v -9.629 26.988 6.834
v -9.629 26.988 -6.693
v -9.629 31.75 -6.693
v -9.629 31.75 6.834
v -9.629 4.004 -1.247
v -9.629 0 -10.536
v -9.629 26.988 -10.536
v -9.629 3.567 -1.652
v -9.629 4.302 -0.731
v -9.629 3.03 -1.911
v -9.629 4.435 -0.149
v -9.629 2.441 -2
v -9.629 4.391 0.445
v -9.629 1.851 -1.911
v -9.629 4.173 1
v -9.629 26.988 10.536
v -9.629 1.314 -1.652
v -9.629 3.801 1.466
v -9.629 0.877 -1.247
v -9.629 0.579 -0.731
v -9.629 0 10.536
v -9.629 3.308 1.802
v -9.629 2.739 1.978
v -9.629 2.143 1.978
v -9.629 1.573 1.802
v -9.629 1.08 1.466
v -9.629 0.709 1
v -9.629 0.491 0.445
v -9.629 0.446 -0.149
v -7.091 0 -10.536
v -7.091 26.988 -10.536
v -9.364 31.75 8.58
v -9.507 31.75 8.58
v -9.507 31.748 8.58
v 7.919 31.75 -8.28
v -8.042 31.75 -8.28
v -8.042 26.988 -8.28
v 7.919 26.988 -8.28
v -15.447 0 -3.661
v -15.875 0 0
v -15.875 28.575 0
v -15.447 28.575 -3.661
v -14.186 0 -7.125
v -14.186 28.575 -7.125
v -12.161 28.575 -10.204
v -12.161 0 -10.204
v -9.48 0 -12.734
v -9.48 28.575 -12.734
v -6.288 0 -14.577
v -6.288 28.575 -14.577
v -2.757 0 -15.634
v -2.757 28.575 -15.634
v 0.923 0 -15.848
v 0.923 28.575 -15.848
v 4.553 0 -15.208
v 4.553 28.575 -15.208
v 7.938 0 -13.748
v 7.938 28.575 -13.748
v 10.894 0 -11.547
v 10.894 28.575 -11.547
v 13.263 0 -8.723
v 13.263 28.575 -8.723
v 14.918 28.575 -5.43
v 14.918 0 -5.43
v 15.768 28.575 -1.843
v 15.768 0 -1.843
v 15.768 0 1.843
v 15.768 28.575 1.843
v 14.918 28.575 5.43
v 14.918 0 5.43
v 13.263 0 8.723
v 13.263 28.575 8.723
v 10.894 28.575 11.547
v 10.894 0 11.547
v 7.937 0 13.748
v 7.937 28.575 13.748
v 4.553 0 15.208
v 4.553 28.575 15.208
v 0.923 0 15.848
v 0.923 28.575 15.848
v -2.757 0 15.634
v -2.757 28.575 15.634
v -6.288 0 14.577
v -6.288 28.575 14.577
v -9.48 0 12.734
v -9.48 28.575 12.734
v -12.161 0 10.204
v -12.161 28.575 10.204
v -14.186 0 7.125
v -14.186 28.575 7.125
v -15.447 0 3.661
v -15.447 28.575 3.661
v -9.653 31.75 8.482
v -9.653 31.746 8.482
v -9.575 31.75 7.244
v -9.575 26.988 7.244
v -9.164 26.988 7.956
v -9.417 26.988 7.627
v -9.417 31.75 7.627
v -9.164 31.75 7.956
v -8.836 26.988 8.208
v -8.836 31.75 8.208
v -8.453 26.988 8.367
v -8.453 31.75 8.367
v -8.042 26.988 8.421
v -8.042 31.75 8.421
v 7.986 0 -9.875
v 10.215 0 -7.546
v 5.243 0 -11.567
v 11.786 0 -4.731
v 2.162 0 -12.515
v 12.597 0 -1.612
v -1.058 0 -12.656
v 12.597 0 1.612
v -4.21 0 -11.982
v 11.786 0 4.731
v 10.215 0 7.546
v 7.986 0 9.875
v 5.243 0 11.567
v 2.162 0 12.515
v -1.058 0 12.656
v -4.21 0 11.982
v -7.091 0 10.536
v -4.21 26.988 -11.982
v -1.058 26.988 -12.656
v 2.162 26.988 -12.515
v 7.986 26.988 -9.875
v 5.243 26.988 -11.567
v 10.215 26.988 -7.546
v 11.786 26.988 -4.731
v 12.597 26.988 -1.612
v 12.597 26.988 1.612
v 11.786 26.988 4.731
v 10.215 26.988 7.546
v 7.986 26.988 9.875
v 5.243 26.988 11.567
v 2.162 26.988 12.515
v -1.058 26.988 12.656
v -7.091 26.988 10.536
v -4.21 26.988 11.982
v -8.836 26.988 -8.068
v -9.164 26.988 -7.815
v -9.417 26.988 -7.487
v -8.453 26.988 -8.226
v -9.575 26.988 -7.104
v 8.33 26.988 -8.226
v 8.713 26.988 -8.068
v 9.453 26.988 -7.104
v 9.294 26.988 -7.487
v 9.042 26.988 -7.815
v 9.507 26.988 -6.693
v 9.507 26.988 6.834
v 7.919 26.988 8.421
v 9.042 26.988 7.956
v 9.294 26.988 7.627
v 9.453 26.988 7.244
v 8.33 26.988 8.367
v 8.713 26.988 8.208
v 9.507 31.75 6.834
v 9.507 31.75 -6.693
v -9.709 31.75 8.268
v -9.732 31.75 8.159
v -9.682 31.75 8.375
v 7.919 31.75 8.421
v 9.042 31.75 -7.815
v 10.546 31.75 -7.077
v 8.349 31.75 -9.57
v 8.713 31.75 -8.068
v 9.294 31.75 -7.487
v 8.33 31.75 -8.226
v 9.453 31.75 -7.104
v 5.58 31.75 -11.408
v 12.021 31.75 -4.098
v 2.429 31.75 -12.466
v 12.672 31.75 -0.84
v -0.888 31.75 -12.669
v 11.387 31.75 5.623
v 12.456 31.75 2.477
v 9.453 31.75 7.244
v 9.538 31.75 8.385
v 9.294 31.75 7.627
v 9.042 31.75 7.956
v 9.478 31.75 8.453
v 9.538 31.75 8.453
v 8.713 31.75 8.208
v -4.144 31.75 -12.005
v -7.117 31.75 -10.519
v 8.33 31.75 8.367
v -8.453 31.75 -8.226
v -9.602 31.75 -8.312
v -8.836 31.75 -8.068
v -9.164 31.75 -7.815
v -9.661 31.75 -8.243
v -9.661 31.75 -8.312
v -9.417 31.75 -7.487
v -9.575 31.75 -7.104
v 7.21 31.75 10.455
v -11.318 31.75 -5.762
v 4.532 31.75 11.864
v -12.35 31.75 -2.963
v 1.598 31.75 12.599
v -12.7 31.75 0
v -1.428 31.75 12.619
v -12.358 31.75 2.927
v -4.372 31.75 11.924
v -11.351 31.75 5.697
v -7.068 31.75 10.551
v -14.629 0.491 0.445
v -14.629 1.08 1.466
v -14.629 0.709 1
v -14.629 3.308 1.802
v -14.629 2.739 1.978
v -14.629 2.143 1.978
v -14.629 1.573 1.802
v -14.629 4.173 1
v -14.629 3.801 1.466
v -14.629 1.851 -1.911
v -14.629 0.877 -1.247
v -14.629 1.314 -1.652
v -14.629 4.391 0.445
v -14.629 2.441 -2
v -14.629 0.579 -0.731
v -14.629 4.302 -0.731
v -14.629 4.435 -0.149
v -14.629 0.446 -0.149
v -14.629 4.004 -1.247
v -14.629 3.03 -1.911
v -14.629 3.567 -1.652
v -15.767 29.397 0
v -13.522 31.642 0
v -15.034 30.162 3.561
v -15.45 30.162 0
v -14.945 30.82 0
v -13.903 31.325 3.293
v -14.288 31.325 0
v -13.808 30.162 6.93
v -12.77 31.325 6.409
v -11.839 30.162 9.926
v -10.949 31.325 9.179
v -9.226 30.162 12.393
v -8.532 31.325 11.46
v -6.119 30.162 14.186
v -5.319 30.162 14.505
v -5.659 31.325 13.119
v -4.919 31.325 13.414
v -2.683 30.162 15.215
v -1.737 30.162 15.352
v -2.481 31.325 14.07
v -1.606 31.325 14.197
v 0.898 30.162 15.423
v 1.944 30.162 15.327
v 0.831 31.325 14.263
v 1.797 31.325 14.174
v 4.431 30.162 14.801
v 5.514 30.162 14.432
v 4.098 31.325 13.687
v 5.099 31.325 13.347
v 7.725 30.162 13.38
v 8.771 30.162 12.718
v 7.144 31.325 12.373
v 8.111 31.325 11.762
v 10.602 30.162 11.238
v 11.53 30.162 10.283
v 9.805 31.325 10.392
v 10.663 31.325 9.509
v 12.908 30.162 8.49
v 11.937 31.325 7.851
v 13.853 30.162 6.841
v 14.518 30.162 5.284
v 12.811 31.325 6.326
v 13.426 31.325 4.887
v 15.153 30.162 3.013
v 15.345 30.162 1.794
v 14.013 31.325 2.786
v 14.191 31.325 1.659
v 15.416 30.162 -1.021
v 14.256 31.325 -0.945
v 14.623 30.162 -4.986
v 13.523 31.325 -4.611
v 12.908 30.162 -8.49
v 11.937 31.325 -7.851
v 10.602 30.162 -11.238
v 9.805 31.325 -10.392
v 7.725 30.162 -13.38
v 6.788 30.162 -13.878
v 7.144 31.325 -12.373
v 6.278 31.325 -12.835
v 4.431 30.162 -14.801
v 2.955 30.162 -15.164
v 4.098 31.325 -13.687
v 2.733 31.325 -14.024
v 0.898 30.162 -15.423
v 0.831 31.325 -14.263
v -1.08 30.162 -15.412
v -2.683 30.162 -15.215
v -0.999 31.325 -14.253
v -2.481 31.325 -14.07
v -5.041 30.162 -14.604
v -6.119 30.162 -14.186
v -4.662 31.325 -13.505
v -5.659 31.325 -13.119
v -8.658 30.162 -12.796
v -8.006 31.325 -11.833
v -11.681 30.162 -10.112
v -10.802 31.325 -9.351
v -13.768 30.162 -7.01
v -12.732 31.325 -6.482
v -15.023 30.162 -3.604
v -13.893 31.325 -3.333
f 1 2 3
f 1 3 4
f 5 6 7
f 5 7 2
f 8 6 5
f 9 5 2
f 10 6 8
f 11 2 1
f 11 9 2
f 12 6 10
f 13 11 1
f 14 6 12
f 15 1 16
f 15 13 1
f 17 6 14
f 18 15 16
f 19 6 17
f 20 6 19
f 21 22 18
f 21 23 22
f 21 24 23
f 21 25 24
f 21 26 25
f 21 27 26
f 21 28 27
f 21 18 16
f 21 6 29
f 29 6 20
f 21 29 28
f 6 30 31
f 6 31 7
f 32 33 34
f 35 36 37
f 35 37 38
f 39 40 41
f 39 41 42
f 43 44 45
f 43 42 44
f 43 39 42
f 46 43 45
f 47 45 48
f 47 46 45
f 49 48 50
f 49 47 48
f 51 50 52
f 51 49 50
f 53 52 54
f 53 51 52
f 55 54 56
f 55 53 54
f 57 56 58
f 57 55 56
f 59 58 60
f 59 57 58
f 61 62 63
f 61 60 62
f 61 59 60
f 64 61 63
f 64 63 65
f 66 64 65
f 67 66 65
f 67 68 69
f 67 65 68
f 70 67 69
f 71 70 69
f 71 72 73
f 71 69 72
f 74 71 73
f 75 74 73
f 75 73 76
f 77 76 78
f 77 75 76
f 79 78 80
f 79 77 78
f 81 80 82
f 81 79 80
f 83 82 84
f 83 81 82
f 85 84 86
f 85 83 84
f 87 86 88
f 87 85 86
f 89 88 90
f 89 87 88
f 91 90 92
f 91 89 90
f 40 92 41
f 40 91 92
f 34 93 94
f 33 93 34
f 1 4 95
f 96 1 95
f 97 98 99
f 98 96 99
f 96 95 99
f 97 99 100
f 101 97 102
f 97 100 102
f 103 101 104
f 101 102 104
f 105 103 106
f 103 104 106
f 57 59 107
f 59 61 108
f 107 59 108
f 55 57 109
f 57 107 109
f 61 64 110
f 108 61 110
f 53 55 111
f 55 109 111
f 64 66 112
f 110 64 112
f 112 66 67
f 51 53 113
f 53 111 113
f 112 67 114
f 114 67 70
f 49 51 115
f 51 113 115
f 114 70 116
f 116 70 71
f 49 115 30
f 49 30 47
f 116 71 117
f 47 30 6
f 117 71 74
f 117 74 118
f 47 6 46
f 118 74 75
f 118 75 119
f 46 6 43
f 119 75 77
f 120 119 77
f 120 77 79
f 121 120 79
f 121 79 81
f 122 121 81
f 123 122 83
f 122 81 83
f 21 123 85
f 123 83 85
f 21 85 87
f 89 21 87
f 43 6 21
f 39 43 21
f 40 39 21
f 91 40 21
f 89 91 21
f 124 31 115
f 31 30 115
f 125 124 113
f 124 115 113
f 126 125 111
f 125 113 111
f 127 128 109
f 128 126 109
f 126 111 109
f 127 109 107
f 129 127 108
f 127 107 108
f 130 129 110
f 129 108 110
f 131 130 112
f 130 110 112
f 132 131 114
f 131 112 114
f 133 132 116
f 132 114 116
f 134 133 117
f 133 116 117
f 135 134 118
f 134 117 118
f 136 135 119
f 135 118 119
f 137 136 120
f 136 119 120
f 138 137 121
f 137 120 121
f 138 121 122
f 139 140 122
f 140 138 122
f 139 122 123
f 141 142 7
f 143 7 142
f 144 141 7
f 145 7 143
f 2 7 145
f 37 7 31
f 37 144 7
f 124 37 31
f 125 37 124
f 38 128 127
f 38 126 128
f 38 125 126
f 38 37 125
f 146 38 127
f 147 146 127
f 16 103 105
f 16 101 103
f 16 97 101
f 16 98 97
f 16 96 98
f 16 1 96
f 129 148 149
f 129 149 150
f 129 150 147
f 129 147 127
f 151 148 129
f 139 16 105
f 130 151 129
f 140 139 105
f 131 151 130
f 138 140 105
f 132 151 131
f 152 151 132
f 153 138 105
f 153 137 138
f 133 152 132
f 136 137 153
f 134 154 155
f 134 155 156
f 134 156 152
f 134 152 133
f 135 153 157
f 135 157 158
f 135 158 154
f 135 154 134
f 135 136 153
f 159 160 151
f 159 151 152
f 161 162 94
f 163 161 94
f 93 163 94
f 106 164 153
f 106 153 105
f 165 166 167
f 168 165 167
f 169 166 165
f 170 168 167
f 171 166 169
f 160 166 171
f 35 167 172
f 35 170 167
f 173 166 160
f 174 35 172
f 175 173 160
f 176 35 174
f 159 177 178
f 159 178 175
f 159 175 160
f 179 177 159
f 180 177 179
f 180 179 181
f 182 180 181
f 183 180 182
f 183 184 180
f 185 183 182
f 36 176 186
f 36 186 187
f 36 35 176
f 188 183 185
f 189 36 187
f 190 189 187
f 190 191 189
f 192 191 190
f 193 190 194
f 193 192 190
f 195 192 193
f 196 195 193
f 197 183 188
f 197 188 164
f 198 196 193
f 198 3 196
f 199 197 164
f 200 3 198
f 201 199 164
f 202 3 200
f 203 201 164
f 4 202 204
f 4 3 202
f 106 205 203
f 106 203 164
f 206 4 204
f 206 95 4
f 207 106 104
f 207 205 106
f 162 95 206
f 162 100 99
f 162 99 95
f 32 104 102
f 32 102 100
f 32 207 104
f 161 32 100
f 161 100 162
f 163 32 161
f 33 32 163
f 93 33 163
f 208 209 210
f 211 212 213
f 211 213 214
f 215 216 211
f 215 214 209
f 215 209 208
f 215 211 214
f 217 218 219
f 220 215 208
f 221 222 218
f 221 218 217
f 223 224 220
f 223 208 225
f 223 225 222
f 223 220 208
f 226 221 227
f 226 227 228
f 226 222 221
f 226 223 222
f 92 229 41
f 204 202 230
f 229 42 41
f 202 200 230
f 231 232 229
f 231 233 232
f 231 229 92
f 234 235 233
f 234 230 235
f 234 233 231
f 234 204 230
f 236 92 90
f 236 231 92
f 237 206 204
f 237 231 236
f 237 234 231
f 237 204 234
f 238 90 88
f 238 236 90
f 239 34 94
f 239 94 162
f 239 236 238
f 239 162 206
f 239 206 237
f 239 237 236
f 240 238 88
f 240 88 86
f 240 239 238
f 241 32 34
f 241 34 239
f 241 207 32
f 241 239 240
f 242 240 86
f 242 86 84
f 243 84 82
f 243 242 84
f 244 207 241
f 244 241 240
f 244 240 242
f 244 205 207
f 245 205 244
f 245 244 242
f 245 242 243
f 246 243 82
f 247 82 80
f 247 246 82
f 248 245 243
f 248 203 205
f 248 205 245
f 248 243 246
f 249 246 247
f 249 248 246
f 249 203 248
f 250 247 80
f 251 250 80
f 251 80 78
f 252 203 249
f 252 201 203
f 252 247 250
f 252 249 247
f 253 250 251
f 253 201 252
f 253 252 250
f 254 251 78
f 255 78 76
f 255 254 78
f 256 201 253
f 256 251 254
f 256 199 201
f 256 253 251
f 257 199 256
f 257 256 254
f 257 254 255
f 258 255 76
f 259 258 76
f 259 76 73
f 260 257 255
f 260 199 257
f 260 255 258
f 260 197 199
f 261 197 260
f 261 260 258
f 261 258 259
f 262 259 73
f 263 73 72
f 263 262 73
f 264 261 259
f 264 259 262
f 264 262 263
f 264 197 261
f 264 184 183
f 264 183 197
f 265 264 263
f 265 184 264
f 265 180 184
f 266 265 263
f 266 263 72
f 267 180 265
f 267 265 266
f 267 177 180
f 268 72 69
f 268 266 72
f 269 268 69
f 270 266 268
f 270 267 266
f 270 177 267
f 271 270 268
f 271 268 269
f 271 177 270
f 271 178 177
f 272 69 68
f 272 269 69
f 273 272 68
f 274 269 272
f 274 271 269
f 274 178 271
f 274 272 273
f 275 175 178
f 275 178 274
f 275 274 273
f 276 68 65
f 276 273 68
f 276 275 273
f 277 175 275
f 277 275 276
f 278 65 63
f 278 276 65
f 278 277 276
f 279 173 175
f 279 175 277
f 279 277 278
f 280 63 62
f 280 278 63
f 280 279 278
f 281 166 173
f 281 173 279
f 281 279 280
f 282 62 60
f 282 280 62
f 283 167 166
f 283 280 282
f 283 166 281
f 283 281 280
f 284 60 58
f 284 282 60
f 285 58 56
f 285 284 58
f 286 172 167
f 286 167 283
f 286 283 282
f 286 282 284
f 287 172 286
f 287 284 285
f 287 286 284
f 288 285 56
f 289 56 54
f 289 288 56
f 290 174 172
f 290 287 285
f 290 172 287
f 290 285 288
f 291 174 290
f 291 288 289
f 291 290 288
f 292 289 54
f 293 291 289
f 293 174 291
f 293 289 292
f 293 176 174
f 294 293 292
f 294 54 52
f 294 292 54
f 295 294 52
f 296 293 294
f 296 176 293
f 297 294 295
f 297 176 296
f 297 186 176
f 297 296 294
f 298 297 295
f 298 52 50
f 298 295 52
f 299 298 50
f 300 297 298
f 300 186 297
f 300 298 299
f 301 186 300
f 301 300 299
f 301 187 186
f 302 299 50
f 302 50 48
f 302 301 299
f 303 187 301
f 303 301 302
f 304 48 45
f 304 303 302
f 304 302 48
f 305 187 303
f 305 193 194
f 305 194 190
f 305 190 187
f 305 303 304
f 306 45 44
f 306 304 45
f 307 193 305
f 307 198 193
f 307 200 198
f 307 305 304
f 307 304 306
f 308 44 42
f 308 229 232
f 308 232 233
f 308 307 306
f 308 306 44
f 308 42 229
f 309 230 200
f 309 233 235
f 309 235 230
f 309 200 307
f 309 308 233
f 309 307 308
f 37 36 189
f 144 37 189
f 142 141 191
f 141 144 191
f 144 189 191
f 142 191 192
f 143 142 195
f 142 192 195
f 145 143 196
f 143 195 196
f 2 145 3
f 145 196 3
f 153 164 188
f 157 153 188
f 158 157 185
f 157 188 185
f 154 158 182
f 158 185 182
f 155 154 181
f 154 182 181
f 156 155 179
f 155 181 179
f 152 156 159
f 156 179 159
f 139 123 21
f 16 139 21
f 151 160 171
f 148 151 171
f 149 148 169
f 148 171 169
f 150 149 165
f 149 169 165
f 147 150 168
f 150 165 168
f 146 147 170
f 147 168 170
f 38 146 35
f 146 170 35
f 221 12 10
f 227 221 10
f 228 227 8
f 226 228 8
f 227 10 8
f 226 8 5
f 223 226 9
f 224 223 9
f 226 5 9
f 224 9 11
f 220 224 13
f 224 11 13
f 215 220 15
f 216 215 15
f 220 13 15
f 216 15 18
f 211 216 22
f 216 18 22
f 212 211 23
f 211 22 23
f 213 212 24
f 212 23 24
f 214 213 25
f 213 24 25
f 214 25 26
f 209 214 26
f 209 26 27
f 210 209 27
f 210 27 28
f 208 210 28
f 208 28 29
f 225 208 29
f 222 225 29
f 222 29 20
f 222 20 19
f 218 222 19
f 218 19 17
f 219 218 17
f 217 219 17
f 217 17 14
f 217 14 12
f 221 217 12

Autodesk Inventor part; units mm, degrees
ref_plane "YZ Plane" through (0, 0, 0) normal (1, 0, 0) x (0, 1, 0)
ref_plane "XZ Plane" through (0, 0, 0) normal (0, 1, 0) x (-1, 0, 0)
ref_plane "XY Plane" through (0, 0, 0) normal (0, 0, 1) x (1, 0, 0)
sketch "Sketch1" plane through (0, 0, 0) normal (0, 1, 0) x (-1, 0, 0)
  circle A0 centre (0, 0) radius 15.875
  dimension "d0" = 31.75
extrude "Extrusion1" add sketch "Sketch1" along normal blind 31.75
fillet "Fillet1" radius 3.175 1 edges at (15.875, 31.75, 0)
sketch "Sketch2" plane through (0, 31.75, 0) normal (0, 1, 0) x (1, 0, 0)
  point P0 (0, 0)
sketch "Sketch3" plane through (0, 0, 0) normal (0, -1, 0) x (1, 0, 0)
  circle A0 centre (0, 0) radius 12.7
  line L0 (-7.091, -10.536) -> (-9.6294, -10.536)
  line L1 (-9.6294, -10.536) -> (-9.6294, 8.2804)
  line L2 (-9.6294, 8.2804) -> (-7.091, 8.2804)
  line L3 (-7.091, 8.2804) -> (-7.091, -10.536)
  line L4 (-7.091, 10.536) -> (-9.6294, 10.536)
  line L5 (-9.6294, 10.536) -> (-9.6294, 8.2804)
  line L6 (-9.6294, 8.2804) -> (-7.091, 8.2804)
  line L7 (-7.091, 8.2804) -> (-7.091, 10.536)
extrude "Extrusion2" cut sketch "Sketch3" against normal blind 26.9875 contours A0 L3 L7 | L7 L2 A0 | A0 L5 L4 | L0 L1 A0 | A0 L1 L2 L3
sketch "Sketch4" plane through (0, 31.75, 0) normal (0, 1, 0) x (1, 0, 0)
  circle A0 centre (0, 0) radius 12.7
  line L0 (-9.6294, 10.536) -> (-9.6294, -10.536) projected
  line L1 (-9.6294, 8.2804) -> (9.5066, 8.2804)
  line L2 (9.5066, 8.2804) -> (9.5066, -8.4211)
  line L3 (9.5066, -8.4211) -> (-9.6294, -8.4211)
  line L4 (-9.6294, -8.4211) -> (-9.6294, 8.2804)
  point P0 (-9.5066, -8.4211)
  point P1 (-9.6294, -8.2804)
extrude "Extrusion3" cut sketch "Sketch4" against normal blind 4.7625 contours L1 L2 L3 A0 L0
fillet "Fillet2" radius 1.5875 5 edges at (-9.6294, 29.3687, -8.2804) (9.5066, 29.3687, -8.2804) (9.5066, 29.3687, 8.4211) (-9.6294, 29.3687, 8.2804) (-9.5066, 29.3687, 8.4211)
sketch "Sketch5" plane through (-9.6294, 0, 10.536) normal (1, 0, 0) x (0, 0, -1)
  circle A0 centre (10.536, 2.4407) radius 2
  point P0 (10.536, 0)
  dimension "d9" = 4
extrude "Extrusion4" cut sketch "Sketch5" against normal blind 5
properties part number "module"
